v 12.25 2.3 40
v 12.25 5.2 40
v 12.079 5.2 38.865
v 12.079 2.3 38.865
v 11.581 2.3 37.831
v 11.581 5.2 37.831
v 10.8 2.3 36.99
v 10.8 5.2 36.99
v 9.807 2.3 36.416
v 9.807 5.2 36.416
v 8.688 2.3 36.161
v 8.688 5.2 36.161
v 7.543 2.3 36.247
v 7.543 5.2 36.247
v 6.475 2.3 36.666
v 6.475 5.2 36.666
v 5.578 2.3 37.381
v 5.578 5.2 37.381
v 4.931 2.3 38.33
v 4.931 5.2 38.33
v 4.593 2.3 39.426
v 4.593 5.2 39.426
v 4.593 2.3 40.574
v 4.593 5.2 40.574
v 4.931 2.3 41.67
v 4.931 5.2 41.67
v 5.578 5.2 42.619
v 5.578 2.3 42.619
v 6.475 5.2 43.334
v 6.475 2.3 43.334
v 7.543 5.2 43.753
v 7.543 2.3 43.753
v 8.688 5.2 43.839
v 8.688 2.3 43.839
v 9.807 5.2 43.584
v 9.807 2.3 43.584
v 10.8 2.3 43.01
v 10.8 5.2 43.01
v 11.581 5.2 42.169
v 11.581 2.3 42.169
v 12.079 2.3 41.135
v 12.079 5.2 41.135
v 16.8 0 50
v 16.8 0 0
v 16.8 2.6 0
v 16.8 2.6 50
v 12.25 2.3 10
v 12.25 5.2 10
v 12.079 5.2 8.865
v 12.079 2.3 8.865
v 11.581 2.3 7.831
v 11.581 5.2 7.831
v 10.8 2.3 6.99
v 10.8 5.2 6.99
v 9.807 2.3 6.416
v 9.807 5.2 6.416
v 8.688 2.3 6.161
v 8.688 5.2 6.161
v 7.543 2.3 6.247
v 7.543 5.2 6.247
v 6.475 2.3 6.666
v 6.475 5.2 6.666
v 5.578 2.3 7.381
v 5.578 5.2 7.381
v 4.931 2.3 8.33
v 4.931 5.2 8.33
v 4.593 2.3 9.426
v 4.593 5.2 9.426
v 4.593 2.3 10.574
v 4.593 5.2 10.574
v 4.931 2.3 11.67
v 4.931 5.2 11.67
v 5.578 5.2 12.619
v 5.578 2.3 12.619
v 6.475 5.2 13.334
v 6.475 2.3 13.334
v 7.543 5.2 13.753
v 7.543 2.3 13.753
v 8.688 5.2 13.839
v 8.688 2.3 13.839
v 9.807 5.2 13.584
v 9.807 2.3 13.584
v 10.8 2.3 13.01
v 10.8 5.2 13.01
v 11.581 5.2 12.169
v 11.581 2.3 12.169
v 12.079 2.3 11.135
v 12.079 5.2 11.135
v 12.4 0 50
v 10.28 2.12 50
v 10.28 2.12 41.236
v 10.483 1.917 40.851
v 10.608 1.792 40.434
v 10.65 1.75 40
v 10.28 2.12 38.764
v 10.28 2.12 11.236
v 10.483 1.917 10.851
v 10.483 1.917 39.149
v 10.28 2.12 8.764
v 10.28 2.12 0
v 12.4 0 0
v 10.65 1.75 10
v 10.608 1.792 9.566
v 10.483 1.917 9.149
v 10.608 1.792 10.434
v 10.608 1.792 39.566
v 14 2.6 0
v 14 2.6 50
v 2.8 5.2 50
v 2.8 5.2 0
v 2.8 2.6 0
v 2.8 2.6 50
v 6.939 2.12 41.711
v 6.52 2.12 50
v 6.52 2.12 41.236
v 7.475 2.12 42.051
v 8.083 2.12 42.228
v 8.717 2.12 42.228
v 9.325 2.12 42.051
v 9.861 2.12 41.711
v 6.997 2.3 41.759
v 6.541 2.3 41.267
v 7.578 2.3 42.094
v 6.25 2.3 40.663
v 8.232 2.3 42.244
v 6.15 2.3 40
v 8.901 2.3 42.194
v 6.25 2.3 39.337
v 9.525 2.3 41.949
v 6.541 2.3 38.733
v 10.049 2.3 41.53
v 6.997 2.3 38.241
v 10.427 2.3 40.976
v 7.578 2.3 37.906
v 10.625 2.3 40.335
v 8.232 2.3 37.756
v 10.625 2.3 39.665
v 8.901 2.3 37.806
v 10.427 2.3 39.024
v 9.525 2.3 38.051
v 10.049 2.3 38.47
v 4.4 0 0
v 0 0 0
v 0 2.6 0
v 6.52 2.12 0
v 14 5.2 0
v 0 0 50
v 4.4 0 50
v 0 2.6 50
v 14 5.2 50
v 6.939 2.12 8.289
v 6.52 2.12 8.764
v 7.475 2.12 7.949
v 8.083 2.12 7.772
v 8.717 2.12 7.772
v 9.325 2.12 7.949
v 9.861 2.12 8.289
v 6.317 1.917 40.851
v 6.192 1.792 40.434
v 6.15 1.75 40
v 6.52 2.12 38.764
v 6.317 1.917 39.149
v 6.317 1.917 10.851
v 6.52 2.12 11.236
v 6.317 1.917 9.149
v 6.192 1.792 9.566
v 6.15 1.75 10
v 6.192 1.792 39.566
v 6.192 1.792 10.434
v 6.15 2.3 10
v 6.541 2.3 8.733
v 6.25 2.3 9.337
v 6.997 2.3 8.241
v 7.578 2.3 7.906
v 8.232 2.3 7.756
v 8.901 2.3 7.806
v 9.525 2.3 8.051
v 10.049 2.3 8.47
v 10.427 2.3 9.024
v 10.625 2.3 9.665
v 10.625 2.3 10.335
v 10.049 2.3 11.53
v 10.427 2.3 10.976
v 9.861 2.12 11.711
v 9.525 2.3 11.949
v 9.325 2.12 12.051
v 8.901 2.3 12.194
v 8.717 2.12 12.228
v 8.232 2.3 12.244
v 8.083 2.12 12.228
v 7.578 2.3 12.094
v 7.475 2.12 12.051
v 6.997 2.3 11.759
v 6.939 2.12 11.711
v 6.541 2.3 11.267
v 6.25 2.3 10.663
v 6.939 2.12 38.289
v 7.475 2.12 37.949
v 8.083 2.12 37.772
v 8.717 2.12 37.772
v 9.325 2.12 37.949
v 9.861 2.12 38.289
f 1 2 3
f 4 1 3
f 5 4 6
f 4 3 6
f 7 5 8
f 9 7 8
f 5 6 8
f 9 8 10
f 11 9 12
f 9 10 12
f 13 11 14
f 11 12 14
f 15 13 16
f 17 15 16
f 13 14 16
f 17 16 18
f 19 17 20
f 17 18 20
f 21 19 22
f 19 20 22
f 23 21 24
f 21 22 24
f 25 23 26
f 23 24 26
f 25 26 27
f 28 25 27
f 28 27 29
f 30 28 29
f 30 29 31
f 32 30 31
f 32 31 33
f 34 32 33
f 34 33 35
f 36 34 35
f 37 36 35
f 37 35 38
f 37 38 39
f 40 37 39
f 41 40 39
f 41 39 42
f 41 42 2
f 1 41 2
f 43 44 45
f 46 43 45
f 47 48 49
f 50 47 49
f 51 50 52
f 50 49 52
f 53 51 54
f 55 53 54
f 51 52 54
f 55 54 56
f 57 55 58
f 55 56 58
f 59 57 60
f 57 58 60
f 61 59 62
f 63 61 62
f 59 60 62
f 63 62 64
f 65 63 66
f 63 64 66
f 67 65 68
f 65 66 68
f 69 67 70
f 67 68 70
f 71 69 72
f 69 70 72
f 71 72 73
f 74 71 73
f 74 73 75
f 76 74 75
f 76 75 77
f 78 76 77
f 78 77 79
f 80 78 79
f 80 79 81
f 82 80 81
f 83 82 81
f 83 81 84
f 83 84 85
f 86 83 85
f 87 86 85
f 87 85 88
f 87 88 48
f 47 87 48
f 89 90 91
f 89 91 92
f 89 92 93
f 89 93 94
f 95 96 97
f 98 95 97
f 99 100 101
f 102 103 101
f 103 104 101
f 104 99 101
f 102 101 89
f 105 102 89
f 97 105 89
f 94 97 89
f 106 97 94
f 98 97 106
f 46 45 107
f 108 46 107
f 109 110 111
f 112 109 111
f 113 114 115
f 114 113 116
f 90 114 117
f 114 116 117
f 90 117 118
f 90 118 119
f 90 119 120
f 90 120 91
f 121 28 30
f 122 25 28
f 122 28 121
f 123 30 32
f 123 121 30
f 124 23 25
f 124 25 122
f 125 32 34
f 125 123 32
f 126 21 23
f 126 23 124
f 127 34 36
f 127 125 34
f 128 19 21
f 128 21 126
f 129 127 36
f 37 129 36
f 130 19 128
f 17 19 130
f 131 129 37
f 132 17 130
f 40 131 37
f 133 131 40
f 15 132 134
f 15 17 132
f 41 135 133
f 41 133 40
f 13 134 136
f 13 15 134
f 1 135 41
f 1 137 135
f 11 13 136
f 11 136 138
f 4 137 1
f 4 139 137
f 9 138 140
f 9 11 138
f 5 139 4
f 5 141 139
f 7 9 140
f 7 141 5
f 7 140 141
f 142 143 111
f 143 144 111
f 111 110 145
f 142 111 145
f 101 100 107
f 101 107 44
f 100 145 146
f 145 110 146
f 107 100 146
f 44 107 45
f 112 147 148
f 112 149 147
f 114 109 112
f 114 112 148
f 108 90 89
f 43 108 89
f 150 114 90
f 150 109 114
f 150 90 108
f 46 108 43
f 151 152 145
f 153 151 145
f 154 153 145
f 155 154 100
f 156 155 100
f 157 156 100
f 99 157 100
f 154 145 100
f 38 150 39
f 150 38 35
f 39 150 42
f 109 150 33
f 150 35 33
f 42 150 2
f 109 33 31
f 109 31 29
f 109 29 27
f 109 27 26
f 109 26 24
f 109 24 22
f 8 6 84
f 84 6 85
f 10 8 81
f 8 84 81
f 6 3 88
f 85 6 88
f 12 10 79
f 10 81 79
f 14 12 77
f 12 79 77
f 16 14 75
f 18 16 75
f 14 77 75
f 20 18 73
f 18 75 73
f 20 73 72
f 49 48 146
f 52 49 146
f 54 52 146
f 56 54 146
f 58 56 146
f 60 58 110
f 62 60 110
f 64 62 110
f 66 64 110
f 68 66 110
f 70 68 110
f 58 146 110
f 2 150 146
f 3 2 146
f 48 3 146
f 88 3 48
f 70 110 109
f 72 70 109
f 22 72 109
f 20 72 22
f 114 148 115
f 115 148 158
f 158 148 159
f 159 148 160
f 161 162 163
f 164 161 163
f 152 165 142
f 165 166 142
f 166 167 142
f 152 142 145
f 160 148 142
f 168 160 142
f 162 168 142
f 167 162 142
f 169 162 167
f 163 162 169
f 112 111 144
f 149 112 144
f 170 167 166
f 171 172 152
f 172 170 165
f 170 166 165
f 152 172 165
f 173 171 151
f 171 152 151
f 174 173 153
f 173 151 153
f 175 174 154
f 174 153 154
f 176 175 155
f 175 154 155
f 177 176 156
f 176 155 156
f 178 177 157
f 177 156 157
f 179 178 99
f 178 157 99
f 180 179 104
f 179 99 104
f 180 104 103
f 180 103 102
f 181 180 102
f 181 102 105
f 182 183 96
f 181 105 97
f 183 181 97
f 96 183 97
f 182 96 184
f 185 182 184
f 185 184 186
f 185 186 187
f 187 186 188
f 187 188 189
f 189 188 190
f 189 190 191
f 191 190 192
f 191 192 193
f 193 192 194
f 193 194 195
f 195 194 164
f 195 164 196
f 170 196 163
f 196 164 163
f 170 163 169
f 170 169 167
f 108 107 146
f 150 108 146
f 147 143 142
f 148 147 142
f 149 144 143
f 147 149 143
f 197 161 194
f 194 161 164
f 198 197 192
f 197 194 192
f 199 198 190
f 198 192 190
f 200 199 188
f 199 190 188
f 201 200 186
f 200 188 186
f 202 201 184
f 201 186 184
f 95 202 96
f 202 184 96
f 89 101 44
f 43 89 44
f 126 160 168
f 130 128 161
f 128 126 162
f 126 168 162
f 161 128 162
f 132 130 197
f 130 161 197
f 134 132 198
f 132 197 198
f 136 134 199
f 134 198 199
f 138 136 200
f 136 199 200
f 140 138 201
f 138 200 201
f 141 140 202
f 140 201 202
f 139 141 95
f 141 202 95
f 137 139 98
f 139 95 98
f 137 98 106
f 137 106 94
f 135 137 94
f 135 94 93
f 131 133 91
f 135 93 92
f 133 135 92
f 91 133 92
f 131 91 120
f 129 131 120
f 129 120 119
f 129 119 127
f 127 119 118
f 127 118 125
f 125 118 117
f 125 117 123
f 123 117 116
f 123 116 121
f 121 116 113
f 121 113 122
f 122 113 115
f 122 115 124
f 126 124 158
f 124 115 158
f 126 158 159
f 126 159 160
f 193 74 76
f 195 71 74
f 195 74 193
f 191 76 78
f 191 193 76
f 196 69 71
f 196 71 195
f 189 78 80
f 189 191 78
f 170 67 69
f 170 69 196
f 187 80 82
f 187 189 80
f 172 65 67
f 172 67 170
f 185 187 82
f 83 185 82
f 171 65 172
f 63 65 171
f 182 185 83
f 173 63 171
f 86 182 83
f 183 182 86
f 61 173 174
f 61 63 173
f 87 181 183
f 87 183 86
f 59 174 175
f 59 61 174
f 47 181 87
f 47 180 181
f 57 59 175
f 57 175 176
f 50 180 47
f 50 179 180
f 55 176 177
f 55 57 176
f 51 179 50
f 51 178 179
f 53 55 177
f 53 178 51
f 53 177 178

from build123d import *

# Parameters (mm, degrees)
EXTRUDE_1_DEPTH              = 50
HOLE_WIZARD_M4_1_D           = 4.5
HOLE_WIZARD_M4_1_CBORE_D     = 7.7
HOLE_WIZARD_M4_1_CBORE_DEPTH = 2.9


with BuildPart() as part:
    # ｽｹｯﾁ1 → ﾎﾞｽ - 押し出し1 (new body)
    with BuildSketch(Plane.XY):
        Polygon((0, 0), (4.4, 0), (6.520098337, 2.120098337), (10.279901663, 2.120098337), (12.4, 0), (16.8, 0), (16.8, 2.6), (14, 2.6), (14, 5.2), (2.8, 5.2), (2.8, 2.6), (0, 2.6), align=None)
    extrude(amount=EXTRUDE_1_DEPTH)

    # M4 丸平ねじ用座ぐり穴1 (through all)
    with Locations(Plane(origin=(8.4, 5.2, 10), x_dir=(1, 0, 0), z_dir=(0, 1, 0))):
        with Locations((0, 0), (0, -30)):
            CounterBoreHole(HOLE_WIZARD_M4_1_D / 2, HOLE_WIZARD_M4_1_CBORE_D / 2, HOLE_WIZARD_M4_1_CBORE_DEPTH)


solid = part.part
